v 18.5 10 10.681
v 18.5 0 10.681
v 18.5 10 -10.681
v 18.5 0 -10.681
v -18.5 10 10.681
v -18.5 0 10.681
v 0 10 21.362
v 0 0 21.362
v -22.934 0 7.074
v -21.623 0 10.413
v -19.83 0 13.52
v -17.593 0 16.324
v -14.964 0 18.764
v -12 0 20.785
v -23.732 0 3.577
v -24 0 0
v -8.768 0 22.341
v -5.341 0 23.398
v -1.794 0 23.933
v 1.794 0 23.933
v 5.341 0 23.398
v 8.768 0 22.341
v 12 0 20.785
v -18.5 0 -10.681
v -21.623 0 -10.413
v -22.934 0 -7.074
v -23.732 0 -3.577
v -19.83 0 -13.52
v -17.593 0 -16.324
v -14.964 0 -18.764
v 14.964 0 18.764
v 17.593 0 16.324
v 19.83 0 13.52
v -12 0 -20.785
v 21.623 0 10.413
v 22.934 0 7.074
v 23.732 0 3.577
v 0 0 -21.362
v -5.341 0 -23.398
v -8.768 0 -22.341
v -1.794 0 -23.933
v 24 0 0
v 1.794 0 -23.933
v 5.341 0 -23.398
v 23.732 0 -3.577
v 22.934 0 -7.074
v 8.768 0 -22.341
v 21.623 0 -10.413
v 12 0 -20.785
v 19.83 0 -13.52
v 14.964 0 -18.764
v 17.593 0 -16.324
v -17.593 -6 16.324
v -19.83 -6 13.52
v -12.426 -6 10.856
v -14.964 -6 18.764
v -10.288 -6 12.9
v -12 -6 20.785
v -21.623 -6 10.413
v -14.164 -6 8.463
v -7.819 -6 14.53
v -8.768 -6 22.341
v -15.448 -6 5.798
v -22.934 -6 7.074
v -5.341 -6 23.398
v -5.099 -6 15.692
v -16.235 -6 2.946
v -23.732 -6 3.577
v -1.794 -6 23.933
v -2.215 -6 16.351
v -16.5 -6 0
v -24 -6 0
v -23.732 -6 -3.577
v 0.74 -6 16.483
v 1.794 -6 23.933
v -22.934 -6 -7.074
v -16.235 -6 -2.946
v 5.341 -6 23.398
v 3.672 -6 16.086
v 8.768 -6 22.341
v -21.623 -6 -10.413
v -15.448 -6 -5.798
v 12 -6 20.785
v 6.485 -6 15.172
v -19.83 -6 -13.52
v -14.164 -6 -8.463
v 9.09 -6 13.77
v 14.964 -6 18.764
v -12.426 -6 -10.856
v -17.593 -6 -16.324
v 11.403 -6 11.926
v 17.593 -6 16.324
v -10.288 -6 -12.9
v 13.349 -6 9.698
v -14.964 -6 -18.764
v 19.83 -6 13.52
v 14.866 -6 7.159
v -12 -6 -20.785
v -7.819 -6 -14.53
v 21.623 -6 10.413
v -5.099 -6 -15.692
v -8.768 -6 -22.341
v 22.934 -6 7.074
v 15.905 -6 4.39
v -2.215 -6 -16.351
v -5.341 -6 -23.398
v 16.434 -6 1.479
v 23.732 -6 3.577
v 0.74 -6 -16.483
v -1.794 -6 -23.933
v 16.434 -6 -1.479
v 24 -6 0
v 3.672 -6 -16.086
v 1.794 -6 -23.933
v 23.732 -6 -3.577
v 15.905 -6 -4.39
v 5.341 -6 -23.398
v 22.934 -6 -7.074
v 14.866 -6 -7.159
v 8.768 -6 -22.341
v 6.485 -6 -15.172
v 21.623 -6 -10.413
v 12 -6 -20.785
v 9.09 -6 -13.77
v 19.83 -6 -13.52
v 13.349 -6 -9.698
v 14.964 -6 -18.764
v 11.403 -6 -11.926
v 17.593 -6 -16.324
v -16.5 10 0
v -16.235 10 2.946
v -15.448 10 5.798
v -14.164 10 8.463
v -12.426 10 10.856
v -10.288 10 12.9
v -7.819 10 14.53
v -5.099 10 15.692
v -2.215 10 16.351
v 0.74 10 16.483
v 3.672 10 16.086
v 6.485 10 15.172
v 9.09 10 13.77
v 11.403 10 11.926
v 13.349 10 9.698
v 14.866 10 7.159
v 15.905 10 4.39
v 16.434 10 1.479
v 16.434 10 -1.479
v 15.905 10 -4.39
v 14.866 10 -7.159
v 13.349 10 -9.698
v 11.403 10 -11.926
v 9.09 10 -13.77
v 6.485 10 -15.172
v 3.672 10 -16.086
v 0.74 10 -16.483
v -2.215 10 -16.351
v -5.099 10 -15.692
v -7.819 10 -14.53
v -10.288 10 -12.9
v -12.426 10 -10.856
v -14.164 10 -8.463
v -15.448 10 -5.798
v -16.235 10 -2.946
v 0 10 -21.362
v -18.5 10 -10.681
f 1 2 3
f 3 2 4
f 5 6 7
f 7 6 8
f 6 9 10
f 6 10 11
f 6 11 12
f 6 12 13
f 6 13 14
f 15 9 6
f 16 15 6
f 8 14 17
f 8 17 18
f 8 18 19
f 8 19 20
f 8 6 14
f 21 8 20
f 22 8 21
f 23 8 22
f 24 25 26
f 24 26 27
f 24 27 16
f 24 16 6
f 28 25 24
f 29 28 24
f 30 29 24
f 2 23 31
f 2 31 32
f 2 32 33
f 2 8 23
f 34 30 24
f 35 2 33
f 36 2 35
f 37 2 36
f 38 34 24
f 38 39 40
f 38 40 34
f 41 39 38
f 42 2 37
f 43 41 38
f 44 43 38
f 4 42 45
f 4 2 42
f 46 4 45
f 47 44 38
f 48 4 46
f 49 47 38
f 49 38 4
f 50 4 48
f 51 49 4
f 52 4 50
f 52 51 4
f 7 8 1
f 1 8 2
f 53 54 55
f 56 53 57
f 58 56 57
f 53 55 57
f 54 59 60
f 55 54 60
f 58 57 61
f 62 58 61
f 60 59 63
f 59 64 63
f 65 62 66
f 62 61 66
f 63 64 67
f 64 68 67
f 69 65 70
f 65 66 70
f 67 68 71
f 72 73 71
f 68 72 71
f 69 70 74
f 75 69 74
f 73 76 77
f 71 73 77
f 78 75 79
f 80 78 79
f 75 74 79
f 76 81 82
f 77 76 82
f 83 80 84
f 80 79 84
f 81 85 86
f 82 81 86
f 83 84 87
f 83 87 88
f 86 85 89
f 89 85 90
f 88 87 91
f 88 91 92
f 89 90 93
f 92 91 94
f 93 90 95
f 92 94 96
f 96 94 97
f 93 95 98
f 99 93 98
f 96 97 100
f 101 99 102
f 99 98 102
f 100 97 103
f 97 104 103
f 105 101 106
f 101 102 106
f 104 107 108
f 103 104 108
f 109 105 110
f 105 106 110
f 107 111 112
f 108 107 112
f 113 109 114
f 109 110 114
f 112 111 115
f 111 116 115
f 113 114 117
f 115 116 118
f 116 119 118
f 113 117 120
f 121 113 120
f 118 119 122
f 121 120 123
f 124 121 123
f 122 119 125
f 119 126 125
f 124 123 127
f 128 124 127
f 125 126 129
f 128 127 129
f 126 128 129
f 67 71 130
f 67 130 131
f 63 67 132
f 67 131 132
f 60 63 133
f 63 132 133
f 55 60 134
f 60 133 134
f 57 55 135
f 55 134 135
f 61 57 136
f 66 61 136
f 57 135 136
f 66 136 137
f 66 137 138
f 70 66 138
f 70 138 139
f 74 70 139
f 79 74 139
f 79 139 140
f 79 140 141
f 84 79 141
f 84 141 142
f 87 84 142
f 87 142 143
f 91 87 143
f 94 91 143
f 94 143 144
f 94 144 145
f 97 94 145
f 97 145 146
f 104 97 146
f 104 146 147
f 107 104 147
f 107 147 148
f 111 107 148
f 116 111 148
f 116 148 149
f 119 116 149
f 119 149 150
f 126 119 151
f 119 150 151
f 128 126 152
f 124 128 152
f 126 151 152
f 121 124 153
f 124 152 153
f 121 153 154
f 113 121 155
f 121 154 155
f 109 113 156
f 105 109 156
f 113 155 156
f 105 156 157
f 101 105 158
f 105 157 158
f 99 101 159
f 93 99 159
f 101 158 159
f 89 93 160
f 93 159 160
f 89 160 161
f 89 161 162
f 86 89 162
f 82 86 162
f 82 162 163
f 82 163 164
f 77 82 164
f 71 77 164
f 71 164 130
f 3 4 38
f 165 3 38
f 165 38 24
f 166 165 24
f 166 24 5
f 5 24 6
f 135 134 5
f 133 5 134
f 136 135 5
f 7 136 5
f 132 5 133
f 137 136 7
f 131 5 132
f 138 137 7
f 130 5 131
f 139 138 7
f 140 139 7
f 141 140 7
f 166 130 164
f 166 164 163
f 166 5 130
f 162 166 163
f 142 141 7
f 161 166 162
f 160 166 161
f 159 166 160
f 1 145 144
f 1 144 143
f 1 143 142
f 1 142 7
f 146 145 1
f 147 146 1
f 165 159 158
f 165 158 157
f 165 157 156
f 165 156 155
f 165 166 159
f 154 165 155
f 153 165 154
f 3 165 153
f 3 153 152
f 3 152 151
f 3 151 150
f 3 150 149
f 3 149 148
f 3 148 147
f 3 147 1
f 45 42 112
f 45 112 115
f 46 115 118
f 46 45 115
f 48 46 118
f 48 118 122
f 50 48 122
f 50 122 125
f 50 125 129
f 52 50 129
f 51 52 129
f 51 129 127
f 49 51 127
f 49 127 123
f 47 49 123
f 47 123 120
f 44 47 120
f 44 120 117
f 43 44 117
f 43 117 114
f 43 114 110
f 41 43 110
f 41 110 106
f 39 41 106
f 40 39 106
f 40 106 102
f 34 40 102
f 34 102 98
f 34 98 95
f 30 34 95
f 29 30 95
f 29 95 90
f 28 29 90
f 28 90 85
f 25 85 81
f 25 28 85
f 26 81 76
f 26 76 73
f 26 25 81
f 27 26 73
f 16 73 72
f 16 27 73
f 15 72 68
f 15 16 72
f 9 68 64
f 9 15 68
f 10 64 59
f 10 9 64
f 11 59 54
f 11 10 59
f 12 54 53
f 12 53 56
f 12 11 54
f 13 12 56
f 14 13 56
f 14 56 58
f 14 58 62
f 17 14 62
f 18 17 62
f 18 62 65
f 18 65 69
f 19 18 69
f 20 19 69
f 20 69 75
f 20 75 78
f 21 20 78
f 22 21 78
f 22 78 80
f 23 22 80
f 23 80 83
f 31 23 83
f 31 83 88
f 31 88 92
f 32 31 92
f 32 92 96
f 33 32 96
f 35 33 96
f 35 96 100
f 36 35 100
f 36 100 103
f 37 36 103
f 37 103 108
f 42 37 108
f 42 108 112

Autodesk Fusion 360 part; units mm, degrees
sketch "スケッチ1" plane through (0, 0, 0) normal (0, 1, 0) x (1, 0, 0)
  line L0 (-18.5, -10.681) -> (0, -21.362)
  line L1 (0, -21.362) -> (18.5, -10.681)
  line L2 (18.5, -10.681) -> (18.5, 10.681)
  line L3 (18.5, 10.681) -> (0, 21.362)
  line L4 (0, 21.362) -> (-18.5, 10.681)
  line L5 (-18.5, 10.681) -> (-18.5, -10.681)
  curve L6
  line L7 (1.75, 0) -> (22.5, 0)
  dimension "d7" = 37
extrude "押し出し1" add sketch "スケッチ1" along normal blind 10
sketch "スケッチ3" plane through (0, 0, 0) normal (0, 1, 0) x (1, 0, 0)
  circle A0 centre (0, 0) radius 24
  dimension "d8" = 48
extrude "押し出し3" add sketch "スケッチ3" against normal blind 6
sketch "スケッチ4" plane through (0, 0, 0) normal (0, 1, 0) x (-1, 0, 0)
  circle A0 centre (0, 0) radius 24
  line L0 (18.5, -10.681) -> (0, -21.362)
  line L1 (0, -21.362) -> (-18.5, -10.681)
  line L2 (-18.5, -10.681) -> (-18.5, 10.681)
  line L3 (-18.5, 10.681) -> (0, 21.362)
  line L4 (0, 21.362) -> (18.5, 10.681)
  line L5 (18.5, 10.681) -> (18.5, -10.681)
  circle A1 centre (0, 0) radius 16.5
  dimension "d11" = 33
extrude "押し出し4" cut sketch "スケッチ4" along normal mid plane 32 contours A1
thread "ねじ2"
